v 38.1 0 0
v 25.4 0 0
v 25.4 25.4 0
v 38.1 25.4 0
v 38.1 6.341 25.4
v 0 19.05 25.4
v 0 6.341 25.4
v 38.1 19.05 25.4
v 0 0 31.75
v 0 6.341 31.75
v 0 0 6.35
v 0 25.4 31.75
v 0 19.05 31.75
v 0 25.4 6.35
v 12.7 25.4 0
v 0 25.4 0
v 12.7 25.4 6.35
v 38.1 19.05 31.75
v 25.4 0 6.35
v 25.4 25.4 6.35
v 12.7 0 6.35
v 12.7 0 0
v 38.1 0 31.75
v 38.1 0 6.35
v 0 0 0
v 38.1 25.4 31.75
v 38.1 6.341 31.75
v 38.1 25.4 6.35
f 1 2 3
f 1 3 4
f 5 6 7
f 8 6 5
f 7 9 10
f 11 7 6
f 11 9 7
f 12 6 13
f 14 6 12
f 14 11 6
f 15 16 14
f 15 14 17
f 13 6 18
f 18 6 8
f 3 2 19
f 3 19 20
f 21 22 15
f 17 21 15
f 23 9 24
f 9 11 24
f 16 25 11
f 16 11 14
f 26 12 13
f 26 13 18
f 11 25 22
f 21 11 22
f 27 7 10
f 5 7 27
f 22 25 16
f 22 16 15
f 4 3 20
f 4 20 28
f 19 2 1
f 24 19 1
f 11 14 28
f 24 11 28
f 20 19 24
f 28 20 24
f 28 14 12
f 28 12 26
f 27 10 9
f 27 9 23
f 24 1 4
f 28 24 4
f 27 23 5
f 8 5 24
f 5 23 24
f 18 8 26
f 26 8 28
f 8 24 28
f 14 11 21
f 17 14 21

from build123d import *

# Parameters (mm, degrees)
F0_W     = 12.7
F0_H     = 25.4
F1_DEPTH = 6.35
F3_W     = 25.4
F3_H     = 25.4
F3_W_2   = 12.7
F4_DEPTH = 19.05
F5_W     = 38.1
F5_H     = 6.3411188312
F6_DEPTH = 6.35
F7_W     = 38.1
F7_H     = 6.35
F8_DEPTH = 6.35


with BuildPart() as f1:
    # F0 (on Top) → F1 (new body)
    with BuildSketch(Plane.XY):
        with Locations((31.75, 12.7)):
            Rectangle(F0_W, F0_H)
    extrude(amount=F1_DEPTH)


with BuildPart() as f1b:
    # F0 (on Top) → F1, piece 2 (new body)
    with BuildSketch(Plane.XY):
        with Locations((6.35, 12.7)):
            Rectangle(F0_W, F0_H)
    extrude(amount=F1_DEPTH)


with BuildPart() as f4:
    # F3 (on face) → F4 (new body)
    with BuildSketch(Plane.XY.offset(6.35)):
        with Locations((25.4, 12.7)):
            Rectangle(F3_W, F3_H)
        with Locations((6.35, 12.7)):
            Rectangle(F3_W_2, F3_H)
    extrude(amount=F4_DEPTH)

    # F5 (on face) → F6 (join)
    with BuildSketch(Plane.XY.offset(25.4)):
        with Locations((19.05, 3.1705594156)):
            Rectangle(F5_W, F5_H)
    extrude(amount=F6_DEPTH)

    # F7 (on face) → F8 (join)
    with BuildSketch(Plane.XY.offset(25.4)):
        with Locations((19.05, 22.225)):
            Rectangle(F7_W, F7_H)
    extrude(amount=F8_DEPTH)


solid = Compound([f1.part, f1b.part, f4.part])
